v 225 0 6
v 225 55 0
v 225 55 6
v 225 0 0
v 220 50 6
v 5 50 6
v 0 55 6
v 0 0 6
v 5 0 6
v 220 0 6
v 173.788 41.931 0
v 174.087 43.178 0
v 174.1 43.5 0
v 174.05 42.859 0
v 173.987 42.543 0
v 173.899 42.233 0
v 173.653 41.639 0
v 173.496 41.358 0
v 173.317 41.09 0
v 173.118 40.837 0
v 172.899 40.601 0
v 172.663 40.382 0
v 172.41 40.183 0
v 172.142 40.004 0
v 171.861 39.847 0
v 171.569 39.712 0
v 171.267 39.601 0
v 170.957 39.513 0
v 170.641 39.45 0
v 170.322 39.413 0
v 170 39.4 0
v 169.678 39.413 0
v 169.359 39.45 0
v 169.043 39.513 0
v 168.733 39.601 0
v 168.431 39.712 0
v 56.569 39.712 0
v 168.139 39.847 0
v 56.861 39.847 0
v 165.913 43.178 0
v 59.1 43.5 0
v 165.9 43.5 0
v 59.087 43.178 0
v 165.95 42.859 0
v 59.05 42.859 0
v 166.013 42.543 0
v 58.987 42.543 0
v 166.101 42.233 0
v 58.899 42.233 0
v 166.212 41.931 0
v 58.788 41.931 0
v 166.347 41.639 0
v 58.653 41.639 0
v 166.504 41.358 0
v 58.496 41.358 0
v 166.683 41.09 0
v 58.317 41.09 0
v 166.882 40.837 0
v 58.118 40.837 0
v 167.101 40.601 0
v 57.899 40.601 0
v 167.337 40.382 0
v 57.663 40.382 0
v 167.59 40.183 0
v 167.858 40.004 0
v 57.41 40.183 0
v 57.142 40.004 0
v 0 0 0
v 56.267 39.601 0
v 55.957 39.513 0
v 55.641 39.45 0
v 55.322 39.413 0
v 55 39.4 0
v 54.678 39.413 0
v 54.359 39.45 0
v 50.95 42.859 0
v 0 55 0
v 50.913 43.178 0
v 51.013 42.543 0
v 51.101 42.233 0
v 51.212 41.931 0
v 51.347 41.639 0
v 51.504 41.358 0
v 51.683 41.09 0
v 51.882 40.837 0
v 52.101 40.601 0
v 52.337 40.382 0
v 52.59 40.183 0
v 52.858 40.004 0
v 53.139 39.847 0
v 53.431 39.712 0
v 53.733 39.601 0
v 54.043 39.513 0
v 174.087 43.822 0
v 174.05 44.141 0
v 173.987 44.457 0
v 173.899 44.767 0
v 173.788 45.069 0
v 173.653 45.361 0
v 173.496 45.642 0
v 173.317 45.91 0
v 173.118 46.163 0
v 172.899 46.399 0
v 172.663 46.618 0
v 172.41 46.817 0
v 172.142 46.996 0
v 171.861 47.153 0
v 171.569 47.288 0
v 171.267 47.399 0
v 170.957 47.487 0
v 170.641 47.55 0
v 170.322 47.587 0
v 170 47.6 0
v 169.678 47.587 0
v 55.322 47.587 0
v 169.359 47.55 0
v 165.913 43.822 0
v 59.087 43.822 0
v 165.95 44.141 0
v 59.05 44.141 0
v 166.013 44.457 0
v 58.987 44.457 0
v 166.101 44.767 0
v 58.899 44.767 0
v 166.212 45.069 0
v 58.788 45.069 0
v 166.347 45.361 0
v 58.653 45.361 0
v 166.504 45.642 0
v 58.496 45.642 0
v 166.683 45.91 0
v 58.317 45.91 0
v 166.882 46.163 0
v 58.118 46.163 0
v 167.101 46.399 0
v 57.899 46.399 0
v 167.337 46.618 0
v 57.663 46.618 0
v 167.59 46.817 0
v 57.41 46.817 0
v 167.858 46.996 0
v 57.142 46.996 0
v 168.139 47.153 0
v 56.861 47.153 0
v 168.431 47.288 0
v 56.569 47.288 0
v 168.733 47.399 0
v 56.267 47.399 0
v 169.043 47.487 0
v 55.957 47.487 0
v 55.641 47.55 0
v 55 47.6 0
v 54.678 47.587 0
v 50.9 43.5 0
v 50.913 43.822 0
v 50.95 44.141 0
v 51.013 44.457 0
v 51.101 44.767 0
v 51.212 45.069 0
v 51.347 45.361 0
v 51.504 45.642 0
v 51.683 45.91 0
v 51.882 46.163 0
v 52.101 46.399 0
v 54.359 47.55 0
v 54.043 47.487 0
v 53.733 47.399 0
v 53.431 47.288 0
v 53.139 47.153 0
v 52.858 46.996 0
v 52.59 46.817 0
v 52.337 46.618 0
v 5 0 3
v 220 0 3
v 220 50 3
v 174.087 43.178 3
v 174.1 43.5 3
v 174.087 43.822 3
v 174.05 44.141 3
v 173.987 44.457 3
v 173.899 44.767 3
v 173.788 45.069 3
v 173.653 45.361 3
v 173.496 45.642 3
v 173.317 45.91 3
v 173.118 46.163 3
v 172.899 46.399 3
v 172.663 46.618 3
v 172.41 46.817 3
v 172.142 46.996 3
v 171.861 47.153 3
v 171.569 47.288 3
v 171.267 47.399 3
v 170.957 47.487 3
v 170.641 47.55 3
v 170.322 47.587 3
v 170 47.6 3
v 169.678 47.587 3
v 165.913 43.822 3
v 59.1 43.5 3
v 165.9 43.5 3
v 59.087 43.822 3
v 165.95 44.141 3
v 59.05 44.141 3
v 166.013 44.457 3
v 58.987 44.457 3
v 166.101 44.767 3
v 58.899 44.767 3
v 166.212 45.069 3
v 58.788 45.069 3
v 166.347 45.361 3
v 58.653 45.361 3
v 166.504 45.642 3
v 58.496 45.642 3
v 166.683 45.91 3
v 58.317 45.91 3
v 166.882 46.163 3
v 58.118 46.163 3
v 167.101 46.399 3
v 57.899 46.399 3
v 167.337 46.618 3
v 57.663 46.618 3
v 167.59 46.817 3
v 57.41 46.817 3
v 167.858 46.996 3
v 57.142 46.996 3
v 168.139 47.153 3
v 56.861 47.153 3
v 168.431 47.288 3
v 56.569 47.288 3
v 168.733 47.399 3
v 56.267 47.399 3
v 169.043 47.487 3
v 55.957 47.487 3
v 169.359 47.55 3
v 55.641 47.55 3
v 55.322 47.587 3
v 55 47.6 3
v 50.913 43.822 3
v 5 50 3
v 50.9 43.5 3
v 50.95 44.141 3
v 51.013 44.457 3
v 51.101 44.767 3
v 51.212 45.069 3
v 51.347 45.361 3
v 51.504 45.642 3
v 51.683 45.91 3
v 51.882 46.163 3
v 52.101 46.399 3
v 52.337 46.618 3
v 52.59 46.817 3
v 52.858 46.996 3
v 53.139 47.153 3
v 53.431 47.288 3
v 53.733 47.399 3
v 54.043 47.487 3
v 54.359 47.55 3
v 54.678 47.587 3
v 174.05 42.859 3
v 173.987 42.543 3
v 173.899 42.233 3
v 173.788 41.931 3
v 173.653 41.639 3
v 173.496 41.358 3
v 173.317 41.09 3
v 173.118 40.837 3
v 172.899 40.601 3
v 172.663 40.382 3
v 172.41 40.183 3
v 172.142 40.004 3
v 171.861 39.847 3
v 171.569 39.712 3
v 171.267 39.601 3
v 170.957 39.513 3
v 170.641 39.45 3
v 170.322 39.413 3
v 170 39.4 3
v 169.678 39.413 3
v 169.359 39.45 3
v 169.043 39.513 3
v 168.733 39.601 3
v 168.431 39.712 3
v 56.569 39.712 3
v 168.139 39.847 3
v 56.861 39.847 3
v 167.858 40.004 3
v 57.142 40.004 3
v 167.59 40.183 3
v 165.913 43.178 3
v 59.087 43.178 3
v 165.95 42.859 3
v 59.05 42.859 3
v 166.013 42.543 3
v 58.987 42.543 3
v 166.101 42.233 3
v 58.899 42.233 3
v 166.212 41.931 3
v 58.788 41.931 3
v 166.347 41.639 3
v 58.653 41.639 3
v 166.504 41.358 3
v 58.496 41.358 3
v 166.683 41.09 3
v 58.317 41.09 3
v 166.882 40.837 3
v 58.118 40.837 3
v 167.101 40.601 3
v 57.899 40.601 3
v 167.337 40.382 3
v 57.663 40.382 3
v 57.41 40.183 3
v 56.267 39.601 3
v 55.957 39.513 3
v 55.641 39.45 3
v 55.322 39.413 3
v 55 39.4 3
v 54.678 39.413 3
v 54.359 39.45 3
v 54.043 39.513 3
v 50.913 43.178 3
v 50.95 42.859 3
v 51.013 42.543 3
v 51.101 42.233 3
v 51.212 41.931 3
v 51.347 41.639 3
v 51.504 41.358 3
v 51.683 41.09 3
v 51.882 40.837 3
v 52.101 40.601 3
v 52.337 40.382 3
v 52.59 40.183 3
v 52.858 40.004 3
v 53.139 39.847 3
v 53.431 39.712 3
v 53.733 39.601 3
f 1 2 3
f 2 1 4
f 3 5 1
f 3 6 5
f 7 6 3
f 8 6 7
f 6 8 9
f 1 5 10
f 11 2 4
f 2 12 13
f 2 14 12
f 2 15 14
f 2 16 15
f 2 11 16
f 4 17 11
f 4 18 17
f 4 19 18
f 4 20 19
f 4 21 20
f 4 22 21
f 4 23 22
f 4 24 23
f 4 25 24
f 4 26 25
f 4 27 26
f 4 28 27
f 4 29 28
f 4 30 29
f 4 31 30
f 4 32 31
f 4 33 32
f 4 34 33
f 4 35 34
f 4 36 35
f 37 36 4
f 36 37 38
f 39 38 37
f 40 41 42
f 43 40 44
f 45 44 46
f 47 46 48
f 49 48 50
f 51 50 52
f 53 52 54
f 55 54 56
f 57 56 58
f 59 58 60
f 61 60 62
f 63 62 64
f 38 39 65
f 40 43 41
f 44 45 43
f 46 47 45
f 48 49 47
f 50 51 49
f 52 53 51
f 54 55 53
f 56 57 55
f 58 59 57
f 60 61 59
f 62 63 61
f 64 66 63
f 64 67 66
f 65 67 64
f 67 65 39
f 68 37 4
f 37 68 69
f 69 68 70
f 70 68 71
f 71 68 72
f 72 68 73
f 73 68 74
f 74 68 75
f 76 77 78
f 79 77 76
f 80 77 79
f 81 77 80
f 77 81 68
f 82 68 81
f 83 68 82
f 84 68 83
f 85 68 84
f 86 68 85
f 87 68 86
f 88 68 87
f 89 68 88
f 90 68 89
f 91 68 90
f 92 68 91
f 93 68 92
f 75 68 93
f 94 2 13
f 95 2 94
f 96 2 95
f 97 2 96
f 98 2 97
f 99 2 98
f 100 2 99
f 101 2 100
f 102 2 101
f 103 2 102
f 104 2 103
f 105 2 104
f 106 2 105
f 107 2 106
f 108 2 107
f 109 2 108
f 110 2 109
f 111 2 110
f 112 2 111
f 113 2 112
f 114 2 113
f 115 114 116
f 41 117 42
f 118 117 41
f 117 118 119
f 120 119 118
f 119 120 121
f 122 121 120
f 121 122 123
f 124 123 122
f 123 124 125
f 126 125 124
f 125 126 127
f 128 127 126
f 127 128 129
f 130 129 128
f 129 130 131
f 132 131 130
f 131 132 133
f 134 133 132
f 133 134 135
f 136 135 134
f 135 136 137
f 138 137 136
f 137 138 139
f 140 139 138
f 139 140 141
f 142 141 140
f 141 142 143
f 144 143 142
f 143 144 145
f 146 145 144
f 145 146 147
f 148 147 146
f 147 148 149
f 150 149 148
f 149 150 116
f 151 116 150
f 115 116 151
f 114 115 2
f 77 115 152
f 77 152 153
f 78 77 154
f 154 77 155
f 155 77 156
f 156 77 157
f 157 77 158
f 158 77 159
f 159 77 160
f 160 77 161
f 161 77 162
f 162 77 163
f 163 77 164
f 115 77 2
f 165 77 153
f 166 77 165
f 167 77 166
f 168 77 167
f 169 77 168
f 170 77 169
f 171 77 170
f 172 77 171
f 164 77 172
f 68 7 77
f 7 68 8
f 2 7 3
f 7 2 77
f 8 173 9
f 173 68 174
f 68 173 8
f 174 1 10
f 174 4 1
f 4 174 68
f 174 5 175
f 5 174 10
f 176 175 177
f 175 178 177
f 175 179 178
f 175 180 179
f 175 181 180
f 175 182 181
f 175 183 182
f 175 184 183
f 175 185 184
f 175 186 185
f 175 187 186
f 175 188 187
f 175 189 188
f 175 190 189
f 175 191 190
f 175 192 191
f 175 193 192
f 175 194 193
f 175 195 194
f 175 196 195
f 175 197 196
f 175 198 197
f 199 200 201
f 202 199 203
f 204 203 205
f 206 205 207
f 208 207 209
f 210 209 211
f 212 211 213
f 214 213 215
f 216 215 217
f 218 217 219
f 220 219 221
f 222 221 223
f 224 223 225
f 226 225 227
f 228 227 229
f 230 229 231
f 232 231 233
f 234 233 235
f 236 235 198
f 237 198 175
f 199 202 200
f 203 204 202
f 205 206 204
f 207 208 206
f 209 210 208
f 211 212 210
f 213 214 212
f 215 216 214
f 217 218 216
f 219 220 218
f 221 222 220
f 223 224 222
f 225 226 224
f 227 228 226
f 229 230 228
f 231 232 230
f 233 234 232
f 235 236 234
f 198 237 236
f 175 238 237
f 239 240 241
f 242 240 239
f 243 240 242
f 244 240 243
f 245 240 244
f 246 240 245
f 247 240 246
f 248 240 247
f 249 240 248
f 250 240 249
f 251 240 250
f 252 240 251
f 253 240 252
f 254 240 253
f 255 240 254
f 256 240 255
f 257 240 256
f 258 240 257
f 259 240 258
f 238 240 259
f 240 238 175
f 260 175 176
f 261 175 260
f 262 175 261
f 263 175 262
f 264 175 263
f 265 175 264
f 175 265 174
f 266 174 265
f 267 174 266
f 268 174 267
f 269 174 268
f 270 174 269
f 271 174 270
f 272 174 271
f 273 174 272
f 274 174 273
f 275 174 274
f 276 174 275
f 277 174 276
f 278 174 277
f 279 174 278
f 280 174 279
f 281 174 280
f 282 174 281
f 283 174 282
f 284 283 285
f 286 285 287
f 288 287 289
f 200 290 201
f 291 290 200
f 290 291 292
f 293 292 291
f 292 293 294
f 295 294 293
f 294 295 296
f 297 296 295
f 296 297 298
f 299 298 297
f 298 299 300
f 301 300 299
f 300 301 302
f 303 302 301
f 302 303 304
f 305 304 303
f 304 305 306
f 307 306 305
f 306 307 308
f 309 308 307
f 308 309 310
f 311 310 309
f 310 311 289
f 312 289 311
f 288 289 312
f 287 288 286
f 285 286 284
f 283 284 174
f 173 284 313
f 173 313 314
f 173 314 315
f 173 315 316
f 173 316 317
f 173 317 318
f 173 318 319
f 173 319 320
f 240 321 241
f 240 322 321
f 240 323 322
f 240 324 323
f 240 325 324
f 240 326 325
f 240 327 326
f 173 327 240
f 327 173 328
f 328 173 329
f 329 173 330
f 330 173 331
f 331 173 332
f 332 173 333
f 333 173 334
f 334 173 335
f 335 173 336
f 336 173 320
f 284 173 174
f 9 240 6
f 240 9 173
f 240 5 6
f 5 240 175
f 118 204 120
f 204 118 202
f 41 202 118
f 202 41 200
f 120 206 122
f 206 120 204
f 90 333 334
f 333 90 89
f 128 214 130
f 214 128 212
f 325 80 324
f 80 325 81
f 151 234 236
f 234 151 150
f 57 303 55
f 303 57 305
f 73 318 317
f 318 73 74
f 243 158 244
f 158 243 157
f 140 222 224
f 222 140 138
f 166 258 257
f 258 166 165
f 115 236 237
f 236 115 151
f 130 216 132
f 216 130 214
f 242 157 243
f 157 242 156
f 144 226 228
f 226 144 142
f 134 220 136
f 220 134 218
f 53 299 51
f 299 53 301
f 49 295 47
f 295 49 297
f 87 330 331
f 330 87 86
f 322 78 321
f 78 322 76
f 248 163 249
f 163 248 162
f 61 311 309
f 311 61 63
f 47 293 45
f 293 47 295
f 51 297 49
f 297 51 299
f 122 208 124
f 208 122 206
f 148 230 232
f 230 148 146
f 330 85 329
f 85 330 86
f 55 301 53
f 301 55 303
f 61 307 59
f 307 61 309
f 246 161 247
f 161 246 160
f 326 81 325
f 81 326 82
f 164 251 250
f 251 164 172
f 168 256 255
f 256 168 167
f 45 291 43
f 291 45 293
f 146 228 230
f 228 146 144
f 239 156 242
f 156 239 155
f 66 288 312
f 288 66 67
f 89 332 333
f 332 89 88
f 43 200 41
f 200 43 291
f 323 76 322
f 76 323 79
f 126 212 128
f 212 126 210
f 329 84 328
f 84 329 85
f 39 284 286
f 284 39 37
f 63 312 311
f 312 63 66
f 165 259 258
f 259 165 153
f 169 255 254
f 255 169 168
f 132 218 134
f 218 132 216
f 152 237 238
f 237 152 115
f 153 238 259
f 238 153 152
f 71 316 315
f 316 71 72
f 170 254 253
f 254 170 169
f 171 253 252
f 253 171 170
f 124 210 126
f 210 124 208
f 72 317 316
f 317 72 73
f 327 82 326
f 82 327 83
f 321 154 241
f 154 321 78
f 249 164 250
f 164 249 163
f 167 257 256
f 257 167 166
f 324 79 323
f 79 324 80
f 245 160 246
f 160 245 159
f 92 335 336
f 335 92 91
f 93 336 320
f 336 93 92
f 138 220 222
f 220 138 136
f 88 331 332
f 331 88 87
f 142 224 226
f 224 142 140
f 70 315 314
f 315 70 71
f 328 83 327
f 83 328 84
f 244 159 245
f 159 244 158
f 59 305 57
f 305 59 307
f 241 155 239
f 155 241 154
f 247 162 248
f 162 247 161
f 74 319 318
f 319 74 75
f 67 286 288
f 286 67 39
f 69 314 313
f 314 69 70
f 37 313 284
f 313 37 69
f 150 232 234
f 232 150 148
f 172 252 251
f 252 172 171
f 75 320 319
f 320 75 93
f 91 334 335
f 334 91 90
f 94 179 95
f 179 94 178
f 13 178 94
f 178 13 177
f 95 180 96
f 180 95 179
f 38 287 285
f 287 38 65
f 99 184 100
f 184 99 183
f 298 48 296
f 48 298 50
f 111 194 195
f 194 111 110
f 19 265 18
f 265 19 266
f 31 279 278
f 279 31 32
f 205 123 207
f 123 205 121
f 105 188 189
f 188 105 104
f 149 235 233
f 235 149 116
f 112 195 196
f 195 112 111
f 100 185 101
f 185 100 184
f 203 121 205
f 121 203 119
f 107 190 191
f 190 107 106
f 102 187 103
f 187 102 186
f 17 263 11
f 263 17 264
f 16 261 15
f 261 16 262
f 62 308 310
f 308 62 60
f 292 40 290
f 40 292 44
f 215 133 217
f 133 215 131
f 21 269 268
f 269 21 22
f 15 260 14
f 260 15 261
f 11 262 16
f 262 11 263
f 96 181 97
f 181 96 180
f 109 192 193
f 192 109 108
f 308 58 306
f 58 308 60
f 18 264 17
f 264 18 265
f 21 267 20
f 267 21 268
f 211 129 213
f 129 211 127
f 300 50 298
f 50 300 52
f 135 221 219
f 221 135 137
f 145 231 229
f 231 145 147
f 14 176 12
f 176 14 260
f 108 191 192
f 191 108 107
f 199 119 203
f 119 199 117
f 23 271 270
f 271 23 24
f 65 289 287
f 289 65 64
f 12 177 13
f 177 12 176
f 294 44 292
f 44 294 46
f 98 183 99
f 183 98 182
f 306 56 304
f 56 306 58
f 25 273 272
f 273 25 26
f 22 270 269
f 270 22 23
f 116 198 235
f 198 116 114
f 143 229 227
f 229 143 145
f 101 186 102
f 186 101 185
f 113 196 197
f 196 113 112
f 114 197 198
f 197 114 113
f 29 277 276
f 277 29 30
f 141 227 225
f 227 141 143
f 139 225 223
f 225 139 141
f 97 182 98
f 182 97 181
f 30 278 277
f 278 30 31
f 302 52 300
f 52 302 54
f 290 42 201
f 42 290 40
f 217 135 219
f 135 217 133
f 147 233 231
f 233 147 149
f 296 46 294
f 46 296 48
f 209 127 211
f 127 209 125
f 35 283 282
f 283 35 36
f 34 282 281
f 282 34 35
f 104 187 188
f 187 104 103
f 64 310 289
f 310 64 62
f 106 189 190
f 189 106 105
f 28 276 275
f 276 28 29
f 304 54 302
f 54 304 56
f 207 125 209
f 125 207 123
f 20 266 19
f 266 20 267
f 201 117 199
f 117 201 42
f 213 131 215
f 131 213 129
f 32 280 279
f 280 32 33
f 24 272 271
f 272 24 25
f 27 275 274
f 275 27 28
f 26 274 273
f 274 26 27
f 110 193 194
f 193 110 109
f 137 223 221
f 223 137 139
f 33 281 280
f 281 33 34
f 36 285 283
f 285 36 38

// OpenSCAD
//frames

$fn=80;
y1=102;
y2=148;
x=215;
z=210;
b=13;
pd=6.3; //profile depth

//right_front();
//right_back();
//left_front();
//left_back();
//back();
//top_front();
//top_back();
//top_back_cable_channel();
//top_back_cover();
//board_cover();
//translate([55, 13, 12.5]) board_cover(); 
//front();
//cover_z_motor();
//cable_clip_1();
//cable_clip_2();
//cable_clip_3();
//cable_clip_alu();
//color("blue", 0.5) {rotate([-90, 0, 90]) translate([8, -15, -80]) cable_support();} //electronic box
//cable_support();
//translate([202, 10, 14.5]) rotate([0, 180, 0]) cable_support();
scratching_aid_magnets_front();

//bohrschablone();

module bohrschablone() {
    w=y1+2*pd;
    h=z+2*pd;
    difference() {
        translate([-5, -5, 0])cube([230, 130, 8]);
        translate([0, 0, 5]) cube([260, 130, 5]);
        
        n1=(h-2*pd)/2-6;  //h-2*pd = y1 or y2
        n2=(w-2*pd)/2-6;
        
        for (i=[0:2])
        translate([6, 6+i*n1, -4]) cylinder(d=3.2, h=10);
        for (i=[0:2])
        translate([w-2*pd-6, 6+i*n1, -4]) cylinder(d=3.2, h=10);
        for (i=[0:2])
        translate([6+i*n2, 6, -4]) cylinder(d=3.2, h=10); 
        //for (i=[0:2])
        //translate([6+i*n2, h-2*pd-6, -4]) cylinder(d=2.9, h=10); 
        
    w=y2+2*pd;
    h=z+2*pd;
    n3=(h-2*pd)/2-6;  //h-2*pd = y1 or y2
    n4=(w-2*pd)/2-6;
        for (i=[0:2]) //links
        translate([6, 6+i*n3, -4]) cylinder(d=3.2, h=10);
        for (i=[0:2])  //rechts
        translate([w-2*pd-6, 6+i*n3, -4]) cylinder(d=3.2, h=10);
        for (i=[0:2])  //unten
        translate([6+i*n4, 6, -4]) cylinder(d=3.2, h=10); 
        //for (i=[0:2])  //oben
        //translate([6+i*n2, h-2*pd-6, -4]) cylinder(d=2.9, h=10);
    //h=z+2*pd-20;
    w1=x+2*pd;
    n5=(h-2*pd)/2-6;  //h-2*pd = y1 or y2
    n6=(w1-2*pd)/2-6; 
        for (i=[0:2]) //links
        translate([6, 6+i*n5, -4]) cylinder(d=3.2, h=10);
        for (i=[0:2])  //rechts
        translate([w1-2*pd-6, 6+i*n5, -4]) cylinder(d=3.2, h=10);
        for (i=[0:2])  //unten
        translate([6+i*n6, 6, -4]) cylinder(d=3.2, h=10); 
    }
}

module frame(w, h, d) {
    difference() {
        translate([-pd, -pd, 0]) cube([w, h, d]);
        translate([b, b, -4]) cube([w-2*pd-2*b, h-2*pd-2*b, 12]);
        //cutout edges
        translate([-pd, -pd, -1]) cube([pd+2.2, pd, 8]);
        translate([-pd, -pd, -1]) cube([pd, pd+2.2, 8]);
        translate([w-2*pd-2.2, -pd, -1]) cube([pd+2.2, pd, 8]);
        translate([w-2*pd, -pd, -1]) cube([pd, pd+2.2, 8]);
        translate([w-2*pd-2.2, h-2*pd, -1]) cube([pd+2.2, pd, 8]);
        translate([w-2*pd, h-2*pd-2.2, -1]) cube([pd, pd+2.2, 8]);
        
        translate([-pd, h-2*pd-2.2, -1]) cube([pd, pd+2.2, 8]);
        translate([-pd, h-2*pd, -1]) cube([pd+2.2, pd, 8]);
    //holes for screws
    n1=(h-2*pd)/2-6;  //h-2*pd = y1 or y2
    n2=(w-2*pd)/2-6;  //w-2*pd = x
    for (i=[0:2])
        translate([6, 6+i*n1, -4]) cylinder(d=2.9, h=10);
    for (i=[0:2])
        translate([w-2*pd-6, 6+i*n1, -4]) cylinder(d=2.9, h=10);
    for (i=[0:2])
        translate([6+i*n2, 6, -4]) cylinder(d=2.9, h=10); 
    for (i=[0:2])
        translate([6+i*n2, h-2*pd-6, -4]) cylinder(d=2.9, h=10);
    }
} 

module left_front() {  //korrigiert
    frame(y1+2*pd, z+2*pd, 5);
    //cable channel
    translate([b-4, b, 5]) cube([4, z-2*b, 7.5]);
    translate([b-4, z-b, 5]) cube([y1-2*b+4, 4, 7.5]);
    //translate([y1-b, b-4, 5]) cube([4, z-2*b+4+4, 7.5]);
    //translate([b-4, b-4, 5]) cube([y1-2*b+4, 4, 7.5]);
    string1 = str("left-front");
    translate ([10, 3, 4]) rotate([0, 0, 0])
    linear_extrude(2.0) text(string1, size = 6, direction = "ltr", spacing = 1 );
}

module right_front() {   //korrigiert
    frame(y1+2*pd, z+2*pd, 5);
    //cable channel
    translate([y1-b, b-4, 5]) cube([4, z-2*b+4+4, 7.5]);
    translate([b-4, z-b, 5]) cube([y1-2*b+4+4, 4, 7.5]);
    translate([b-4, 155, 5]) cube([4, 46, 7.5]);
    string1 = str("right-front");
    translate ([10, 3, 4]) rotate([0, 0, 0])
    linear_extrude(2.0) text(string1, size = 6, direction = "ltr", spacing = 1 );
}

module right_back() {  //okay
    frame(y2+2*pd, z+2*pd, 5);
    string1 = str("right-back");
    translate ([10, 3, 4]) rotate([0, 0, 0])
    linear_extrude(2.0) text(string1, size = 6, direction = "ltr", spacing = 1 );
}

module left_back() {
    frame(y2+2*pd, z+2*pd, 5);
    //cable channel
    translate([y2-b, b-4, 5]) cube([4, z-2*b+4+4, 7.5]);
    //translate([b-4, b-4, 5]) cube([4, z-2*b+4+4, 7.5]);
    translate([b, z-b, 5]) cube([y2-2*b, 4, 7.5]);
    //translate([b-4, b-4, 5]) cube([y2-2*b+4, 4, 7.5]);
    string1 = str("left-back");
    translate ([10, 3, 4]) rotate([0, 0, 0])
    linear_extrude(2.0) text(string1, size = 6, direction = "ltr", spacing = 1 );
}

module back() {  
    difference() {
        union() {
        frame(x+2*pd, z+2*pd-20, 5);
        translate([0, 0, -2.5]) cube([x, z-20, 3]);
            //cable channel
    translate([b, b-4, 5]) cube([130, 4, 7.5-2]);
        }
        //cutout bottom
        translate([-10, -8, -4]) cube([240, 8, 10]);
        //cutout center
        translate([b, b, -4]) cube([(x+2*pd)-2*pd-2*b, (z+2*pd-20)-2*pd-2*b, 12]);
        //cutout camera tower holder
        translate([-10, 20+1, -4]) cube([250, 110, 10]);
        //cutout spindle
        translate([x-32.5, 5.1, -3]) cylinder(d=8.2, h=10);
        translate([x-32.5-8.2/2, -1, -3]) cube([8.2, 6.1, 10]);
        //cutout rack-holder
        translate([x-49.5, 9.3, 0]) cube([32, 4, 7.5]);
        //cutout motor cable
        translate([x-35-32, 3, -3]) cylinder(d=4, h=10);
        translate([x-35-32-4/2, -1, -3]) cube([4, 4, 10]); 
    //holes for screws
    h=z+2*pd-20;
    w=x+2*pd;
    n1=(h-2*pd)/2-6;  //h-2*pd = y1 or y2
    n2=(w-2*pd)/2-6;  //w-2*pd = x
    for (i=[0:2])
        translate([6, 6+i*n1, -4]) cylinder(d=2.8, h=12);
    for (i=[0:2])
        translate([w-2*pd-6, 6+i*n1, -4]) cylinder(d=2.8, h=12);
    for (i=[0:2])
        translate([6+i*n2, 6, -4]) cylinder(d=2.8, h=12); 
    for (i=[0:2])
        translate([6+i*n2, h-2*pd-6, -4]) cylinder(d=2.8, h=12);
    //cut in 2 parts: -10 to 100, 100 to 230
        //translate([100, -10, -5]) cube([130, 250, 20]);
    string1 = str("top-back");
    translate ([160, 185, 4]) rotate([0, 0, 0])
    linear_extrude(2.0) text(string1, size = 6, direction = "ltr", spacing = 1 );
    string2 = str("bottom-back");
    translate ([15, 3, 4]) rotate([0, 0, 0])
    linear_extrude(2.0) text(string2, size = 6, direction = "ltr", spacing = 1 );
        }
    //cable channel
    //translate([b, b-4, 5]) cube([130, 4, 7.5]);
     //test camera-holder
     //translate([0, 20, 0]) import("camera-holder-90Grad.stl");
     //translate([0, 95, 0]) cylinder(d=2.9, h=10);   
        w=x+2*pd;
    translate([-pd, 0, 0]) cube([pd+2, 6, 5]);
    translate([w-2*pd-2, 0, 0]) cube([pd+2, 6, 5]);
        //([w-2*pd-2, -pd, -1])
}

module top_front() {
    frame(x+2*pd, y1+2*pd, 5);
    //testing panel
    //translate([0, 0, 3]) import("panels_top-front.stl");
    string1 = str("top-front");
    translate ([20, 3, 4]) rotate([0, 0, 0])
    linear_extrude(2.0) text(string1, size = 6, direction = "ltr", spacing = 1 );
    difference() {
        translate([b, 89, 5]) cube([189, 7, 7]);
        //translate([b-1, 90, 5]) rotate([45, 0, 0]) cube([191, 11, 7]);
        translate([b-1, 90-11, 5]) rotate([0, 0, 0]) cube([191, 11, 7]);
    }
}

module top_back() {
    difference()  {
        frame(x+2*pd, y2+2*pd, 5);
        //srew hole top connector e-axis
        translate([215-5, y2-74.55, -1]) cylinder(d=3.9, h =10);
        string1 = str("top-back ↑");
    translate ([80, 140, 2]) rotate([0, 180, 0])
    linear_extrude(2.0) text(string1, size = 6, direction = "ltr", spacing = 1 );
        //cut for testing
        //translate([-10, -10, -2]) cube([200, 180, 10]);
    }
}

module frame_electronic_box(w, h, d) {
    difference() {
        translate([-pd, -pd, 0]) cube([w, h, d]);
        translate([b, b, -4]) cube([w-2*pd-2*b, h-2*pd-2*b, 12]);
        //cutout edges
        translate([-pd, -pd, -1]) cube([pd+2, pd, 8]);
        translate([-pd, -pd, -1]) cube([pd, pd+2, 8]);
        translate([w-2*pd-2, -pd, -1]) cube([pd+2, pd, 8]);
        translate([w-2*pd, -pd, -1]) cube([pd, pd+2, 8]);
        translate([w-2*pd-2, h-2*pd, -1]) cube([pd+2, pd, 8]);
        translate([w-2*pd, h-2*pd-2, -1]) cube([pd, pd+2, 8]);
        
        translate([-pd, h-2*pd-2, -1]) cube([pd, pd+2, 8]);
        translate([-pd, h-2*pd, -1]) cube([pd+2, pd, 8]);
        
    //holes for screws
    /*n1=(h-2*pd)/2-6;  //h-2*pd = y1 or y2
    n2=(w-2*pd)/2-6;  //w-2*pd = x
    for (i=[0:2])
        translate([6, 6+i*n1, -4]) cylinder(d=3.3, h=10);
    for (i=[0:2])
        translate([w-2*pd-6, 6+i*n1, -4]) cylinder(d=3.3, h=10);
    */
    translate([6, y2-20, -2]) cylinder(d=3.3, h=15);
    translate([6, y2-70, -2]) cylinder(d=3.3, h=15);
    translate([w-2*pd-5.5, 30, -2]) cylinder(d=3.3, h=15);
    translate([w-2*pd-5.5, y2-40, -2]) cylinder(d=3.3, h=15);
    }
} 

module top_back_cable_channel() {
    difference()  {
        union() {
        frame_electronic_box(x+2*pd, y2+2*pd, 5);
            translate([13, 13, 0]) cube([10, 128, 5]);
        }
        //cutout bracket e-axis top
        translate([-7, 40, -1]) cube([22, 22, 8]);
        //cutout for e-motor
        translate([19, 28, -1]) cube([6, 46, 8]); 
        
        string1 = str("top-back ↑");
        translate ([140, 140, 4]) rotate([0, 0, 0])
    linear_extrude(2.0) text(string1, size = 6, direction = "ltr", spacing = 1 );
    }
    //cable channel
    difference() {
        union() {
    translate([18, b-4, 5]) cube([x-b-13-4-5, 4, 7.5]);
    translate([13, y2-b, 5]) cube([x-b-13-4, 4, 7.5]);
        }
        translate([212-70-5, 0, 5+7.5-4.5]) rotate([-90, 0, 0]) cylinder(d=2.7, h=150);
    }
    
}

module top_back_cover() {
    difference()  {
        frame(x+2*pd, y2+2*pd, 5);
        //srew hole top connector e-axis
        //translate([215-5, y2-74.55, -1]) cylinder(d=3.9, h =10);
        
        //cutout bracket e-axis top
        translate([-7, 41, -1]) cube([22, 20, 8]);
        //cut for testing
        //translate([-10, -10, -2]) cube([200, 180, 10]);
        string1 = str("top-back ↑");
        translate ([140, 140, 4]) rotate([0, 0, 0])
    linear_extrude(2.0) text(string1, size = 6, direction = "ltr", spacing = 1 );
        holes_2();
    }
    //cable channel
    //translate([13, b-4, 5]) cube([x-b-13-4, 4, 7.5]);
    
    //support for board_cover
    difference() {
        union() {
        translate([13, b-5, 5]) cube([x-b-13, 5, 27]);
        translate([13, y2-13, 5]) cube([x-b-13, 5, 27]);   
        }
        translate([10-1, b-4+4, 27.5]) rotate([0, 90, 0]) cylinder(d=5, h=x-b-13+8);
        translate([10-1, y2-13, 27.5]) rotate([0, 90, 0]) cylinder(d=5, h=x-b-13+8);
    }
    //cube([13, 15, 25]);
    translate([b, b, 0]) cube([3, y2-b, 5]);
}

module board_cover() {
    cube([150, 122, 4.8]);
    rotate([0, 90, 0]) translate([-4.8/2, 0, 0]) cylinder(d=4.8, h=150);
    rotate([0, 90, 0]) translate([-4.8/2, 122, 0]) cylinder(d=4.8, h=150);
}


module holes_2() {
//holes for screws top_back_cover 3.2 mm
    h=y2+2*pd;
    w=x+2*pd;
    n1=(h-2*pd)/2-6;  //h-2*pd = y1 or y2
    n2=(w-2*pd)/2-6;  //w-2*pd = x
    for (i=[0:2])
        translate([6, 6+i*n1, -4]) cylinder(d=3.2, h=10);
    for (i=[0:2])
        translate([w-2*pd-6, 6+i*n1, -4]) cylinder(d=3.2, h=10);
    for (i=[0:2])
        translate([6+i*n2, 6, -4]) cylinder(d=3.2, h=10); 
    for (i=[0:2])
        translate([6+i*n2, h-2*pd-6, -4]) cylinder(d=3.2, h=10);
}

module front() {
    difference() {
        union() {
        frame(x+2*pd, z+2*pd-20, 5);
        cube([x, z-20, 7]);
        }
        translate([-10, -7, -1]) cube([230, 7, 8]);
        translate([b, b, -1]) cube([x-2*b, z-20-2*b, 14]);
        //cutout plate holder
        translate([26, 5, -1]) cube([176, 9, 10]);
        //cutout screw
        translate([92, -2, 0]) rotate([-90, 0, 0]) cylinder(d=6, h=10);
        //cutout magnets
        translate([50, 184,-1]) cylinder(d=8.2, h=4);
        translate([215-50, 184,-1]) cylinder(d=8.2, h=4);
        translate([50, 184, 7-3]) cylinder(d=9, h=4);
        translate([215-50, 184, 7-3]) cylinder(d=9, h=4);
        //cutout endstop connector
        translate([220-6-5, -1, -1]) cube([15, 10, 3.5]);
        //cutout vial-rack-holder
        translate([201, 5, -1]) cube([4, 12, 10]);
    }
    difference() {
        translate([92+60, 0, -6]) cube([16, 5, 6]);
        translate([92+66, -2, -5]) rotate([-90, 0, 0]) cylinder(d=6, h=10);
    }
}

module holes() {
    for (i=[1:6])
        translate([-10, -28+i*40, -1]) slit_y();  //y
    //for (i=[1:6])
        //translate([215+10, -150+i*40, -1]) slit_y();  //y
    //for (i=[1:7])
        //translate([i*30-14, 135+10, -1]) slit_x();  //x
    //for (i=[1:7])
        //translate([i*30-14, -135-10, -1]) slit_x();  //x
    //holes for legs
    //translate([4*30-14, -135-10, -1]) cylinder(d=5.2, h=10); //front
    //translate([-10.5, 110+8, -1]) cylinder(d=5.2, h=10);   //back
    //translate([215+10, -130+8*30+8, -1]) cylinder(d=5.2, h=10); //back    
}

module slit_x() {
    hull()  {
        cylinder(d=3.2, h=5);
        translate([8, 0, 0]) cylinder(d=3.2, h=5);
    }
}

module slit_y() {
    hull()  {
        cylinder(d=3.2, h=5);
        translate([0, 8, 0]) cylinder(d=3.2, h=5);
    }
}

module cover_z_motor() {
    difference() {
        union() {
            cube([46, 10, 28]);
            translate([-5, 0, 0]) cube([46+5+5, 2, 28+5]);
        }
        translate([2, -2, -2]) cube([42, 20, 28]);

    //hole for screw panel mounting
    translate([46+5-1.5, -1, 6]) rotate([-90, 0, 0]) cylinder(d=6, h=5);
    }
}

module cable_clip_1() {
    h1=20; //length
    difference() {
        union() {
    cube([20, 2, h1]);
    translate([0, 0, 0]) cube([1, 7, h1]);
    translate([5, 0, 0]) cube([1, 7, h1]);
    translate([5, 5, 0]) cylinder(d=0.8, h=h1);
        }
        translate([1.4, 5.5, -1]) rotate([0, 0, 45]) cube([2, 2, h1+2]);
        translate([3.6, 7.4, -1]) rotate([0, 0, -45]) cube([2, 2, h1+2]);
        string1 = str("1");
    translate ([7, 1.5, 4]) rotate([90, 0, 0])
    linear_extrude(2.0) text(string1, size = 6, direction = "ltr", spacing = 1 );
    }
}

module cable_clip_2() {
    h1=20; //length
    difference() {
        union() {
    cube([16, 2, h1]);
    translate([0, 0, 0]) cube([1, 7, h1]);
    translate([5, 0, 0]) cube([1, 7, h1]);
    translate([5, 5, 0]) cylinder(d=0.8, h=h1);
        }
        translate([1.4, 5.5, -1]) rotate([0, 0, 45]) cube([2, 2, h1+2]);
        translate([3.6, 7.4, -1]) rotate([0, 0, -45]) cube([2, 2, h1+2]);
        string1 = str("2");
    translate ([7, 1.5, 4]) rotate([90, 0, 0])
    linear_extrude(2.0) text(string1, size = 6, direction = "ltr", spacing = 1 );
    }
}

module cable_clip_3() {
    h1=20; //length
    difference() {
        union() {
    cube([13, 2, h1]);
    translate([0, 0, 0]) cube([1, 7, h1]);
    translate([5, 0, 0]) cube([1, 7, h1]);
    translate([5, 5, 0]) cylinder(d=0.8, h=h1);
        }
        translate([1.4, 5.5, -1]) rotate([0, 0, 45]) cube([2, 2, h1+2]);
        translate([3.45, 7.4, -1]) rotate([0, 0, -45]) cube([2, 2, h1+2]);
        string1 = str("3");
    translate ([4, 1.5, 4]) rotate([90, 0, 0])
    linear_extrude(2.0) text(string1, size = 6, direction = "ltr", spacing = 1 );
    }
}

module cable_clip_alu() {
    h1=20; //length
    difference() {
        union() {
    cube([16, 2, h1]);
    translate([5.25, 0, 0]) cube([1, 6, h1]);
    translate([16-5.25-1, 0, 0]) cube([1, 6, h1]);
    translate([5.25, 4, 0]) cylinder(d=0.5, h=h1);
    translate([16-5.25, 4, 0]) cylinder(d=0.5, h=h1);       
            }
        translate([6.25, 5, -1]) rotate([0, 0, 45]) cube([2, 2, h1+2]);
        translate([16-5.25-1, 5, -1]) rotate([0, 0, 45]) cube([2, 2, h1+2]);
    string1 = str("alu");
    translate ([3, 1, 4]) rotate([90, 0, 0])
    linear_extrude(2.0) text(string1, size = 6, direction = "ltr", spacing = 1 );
    }
}

module cable_support_old() {
    h1=50; //length
    difference() {
        union() {
            cube([10, 3, h1]);
            //translate([5, 0, 0]) cube([5, 18, h1]);
            translate([6, 0, 0]) cube([122+4, 3, h1]);
            //translate([122+3, 12, 0]) cube([5, 7, h1]);
            translate([0, 0, 0]) cube([1, 7+2, h1]);
            translate([5, 0, 0]) cube([1, 7+2, h1]);
            translate([5, 5+2, 0]) cylinder(d=0.8, h=h1);
            translate([122+4, 0, 0]) cube([1, 7+2, h1]);
            translate([5+122+4, 0, 0]) cube([1, 7+2, h1]);
            translate([5+122+4, 5+2, 0]) cylinder(d=0.8, h=h1);
        }
            translate([1.4, 5.5+2, -1]) rotate([0, 0, 45]) cube([2, 2, h1+2]);
            translate([3.6, 7.4+2, -1]) rotate([0, 0, -45]) cube([2, 2, h1+2]);
            translate([1.4+122+4, 5.5+2, -1]) rotate([0, 0, 45]) cube([2, 2, h1+2]);
            translate([3.6+122+4, 7.4+2, -1]) rotate([0, 0, -45]) cube([2, 2, h1+2]);
            //translate([122+5, 13, -1]) cube([5, 5, h1+2]);
    string1 = str("cable support");
    translate ([20, 1, 3]) rotate([90, 0, 0])
    linear_extrude(2.0) text(string1, size = 6, direction = "ltr", spacing = 1 );
    }
    //translate([6, 10, 0]) cube([118, 3, 10]);
}

module cable_support()  {
    B=122+10+10;
    difference() {
        union() {
    translate([0, 0, 0]) cube([130, 136, 2]);
    //translate([0, -10, 2]) cube([130, 3, 7]);
    translate([0, 7, 2]) cube([130, 3, 7]);
    translate([0, 0, 2]) cube([130, 3, 7]);
    translate([0, 136-3, 2]) cube([130, 3, 7]);
    translate([0, 136-3-4-3, 2]) cube([130, 3, 7]);
    //translate([0, -10, 0]) cube([130, 7, 2]);
        }
        //hole for cables+plug
        translate([75, 11, -1]) cube([15, 15, 6]);
        //translate([85, 15, -1]) cylinder(d=10, h=6);
        //holes for mounting
        translate([60, 10, 6.5]) rotate([90, 0, 0]) cylinder(d=3.2, h=20);
        translate([60, 140, 6.5]) rotate([90, 0, 0]) cylinder(d=3.2, h=20);
    }
}

module scratching_aid_magnets_front() {
    difference() {
        cube([215+10, 50+5, 6]);
        translate([5, -1, 3]) cube([215, 51, 4]);
        translate([50+5, 50-6.5,-1]) cylinder(d=8.2, h=7);
        translate([165+5, 50-6.5,-1]) cylinder(d=8.2, h=7);
    }
    //cutout magnets
        //translate([50, 184,-1]) cylinder(d=8.2, h=4);
        //translate([215-50, 184,-1]) cylinder(d=8.2, h=4);
}
